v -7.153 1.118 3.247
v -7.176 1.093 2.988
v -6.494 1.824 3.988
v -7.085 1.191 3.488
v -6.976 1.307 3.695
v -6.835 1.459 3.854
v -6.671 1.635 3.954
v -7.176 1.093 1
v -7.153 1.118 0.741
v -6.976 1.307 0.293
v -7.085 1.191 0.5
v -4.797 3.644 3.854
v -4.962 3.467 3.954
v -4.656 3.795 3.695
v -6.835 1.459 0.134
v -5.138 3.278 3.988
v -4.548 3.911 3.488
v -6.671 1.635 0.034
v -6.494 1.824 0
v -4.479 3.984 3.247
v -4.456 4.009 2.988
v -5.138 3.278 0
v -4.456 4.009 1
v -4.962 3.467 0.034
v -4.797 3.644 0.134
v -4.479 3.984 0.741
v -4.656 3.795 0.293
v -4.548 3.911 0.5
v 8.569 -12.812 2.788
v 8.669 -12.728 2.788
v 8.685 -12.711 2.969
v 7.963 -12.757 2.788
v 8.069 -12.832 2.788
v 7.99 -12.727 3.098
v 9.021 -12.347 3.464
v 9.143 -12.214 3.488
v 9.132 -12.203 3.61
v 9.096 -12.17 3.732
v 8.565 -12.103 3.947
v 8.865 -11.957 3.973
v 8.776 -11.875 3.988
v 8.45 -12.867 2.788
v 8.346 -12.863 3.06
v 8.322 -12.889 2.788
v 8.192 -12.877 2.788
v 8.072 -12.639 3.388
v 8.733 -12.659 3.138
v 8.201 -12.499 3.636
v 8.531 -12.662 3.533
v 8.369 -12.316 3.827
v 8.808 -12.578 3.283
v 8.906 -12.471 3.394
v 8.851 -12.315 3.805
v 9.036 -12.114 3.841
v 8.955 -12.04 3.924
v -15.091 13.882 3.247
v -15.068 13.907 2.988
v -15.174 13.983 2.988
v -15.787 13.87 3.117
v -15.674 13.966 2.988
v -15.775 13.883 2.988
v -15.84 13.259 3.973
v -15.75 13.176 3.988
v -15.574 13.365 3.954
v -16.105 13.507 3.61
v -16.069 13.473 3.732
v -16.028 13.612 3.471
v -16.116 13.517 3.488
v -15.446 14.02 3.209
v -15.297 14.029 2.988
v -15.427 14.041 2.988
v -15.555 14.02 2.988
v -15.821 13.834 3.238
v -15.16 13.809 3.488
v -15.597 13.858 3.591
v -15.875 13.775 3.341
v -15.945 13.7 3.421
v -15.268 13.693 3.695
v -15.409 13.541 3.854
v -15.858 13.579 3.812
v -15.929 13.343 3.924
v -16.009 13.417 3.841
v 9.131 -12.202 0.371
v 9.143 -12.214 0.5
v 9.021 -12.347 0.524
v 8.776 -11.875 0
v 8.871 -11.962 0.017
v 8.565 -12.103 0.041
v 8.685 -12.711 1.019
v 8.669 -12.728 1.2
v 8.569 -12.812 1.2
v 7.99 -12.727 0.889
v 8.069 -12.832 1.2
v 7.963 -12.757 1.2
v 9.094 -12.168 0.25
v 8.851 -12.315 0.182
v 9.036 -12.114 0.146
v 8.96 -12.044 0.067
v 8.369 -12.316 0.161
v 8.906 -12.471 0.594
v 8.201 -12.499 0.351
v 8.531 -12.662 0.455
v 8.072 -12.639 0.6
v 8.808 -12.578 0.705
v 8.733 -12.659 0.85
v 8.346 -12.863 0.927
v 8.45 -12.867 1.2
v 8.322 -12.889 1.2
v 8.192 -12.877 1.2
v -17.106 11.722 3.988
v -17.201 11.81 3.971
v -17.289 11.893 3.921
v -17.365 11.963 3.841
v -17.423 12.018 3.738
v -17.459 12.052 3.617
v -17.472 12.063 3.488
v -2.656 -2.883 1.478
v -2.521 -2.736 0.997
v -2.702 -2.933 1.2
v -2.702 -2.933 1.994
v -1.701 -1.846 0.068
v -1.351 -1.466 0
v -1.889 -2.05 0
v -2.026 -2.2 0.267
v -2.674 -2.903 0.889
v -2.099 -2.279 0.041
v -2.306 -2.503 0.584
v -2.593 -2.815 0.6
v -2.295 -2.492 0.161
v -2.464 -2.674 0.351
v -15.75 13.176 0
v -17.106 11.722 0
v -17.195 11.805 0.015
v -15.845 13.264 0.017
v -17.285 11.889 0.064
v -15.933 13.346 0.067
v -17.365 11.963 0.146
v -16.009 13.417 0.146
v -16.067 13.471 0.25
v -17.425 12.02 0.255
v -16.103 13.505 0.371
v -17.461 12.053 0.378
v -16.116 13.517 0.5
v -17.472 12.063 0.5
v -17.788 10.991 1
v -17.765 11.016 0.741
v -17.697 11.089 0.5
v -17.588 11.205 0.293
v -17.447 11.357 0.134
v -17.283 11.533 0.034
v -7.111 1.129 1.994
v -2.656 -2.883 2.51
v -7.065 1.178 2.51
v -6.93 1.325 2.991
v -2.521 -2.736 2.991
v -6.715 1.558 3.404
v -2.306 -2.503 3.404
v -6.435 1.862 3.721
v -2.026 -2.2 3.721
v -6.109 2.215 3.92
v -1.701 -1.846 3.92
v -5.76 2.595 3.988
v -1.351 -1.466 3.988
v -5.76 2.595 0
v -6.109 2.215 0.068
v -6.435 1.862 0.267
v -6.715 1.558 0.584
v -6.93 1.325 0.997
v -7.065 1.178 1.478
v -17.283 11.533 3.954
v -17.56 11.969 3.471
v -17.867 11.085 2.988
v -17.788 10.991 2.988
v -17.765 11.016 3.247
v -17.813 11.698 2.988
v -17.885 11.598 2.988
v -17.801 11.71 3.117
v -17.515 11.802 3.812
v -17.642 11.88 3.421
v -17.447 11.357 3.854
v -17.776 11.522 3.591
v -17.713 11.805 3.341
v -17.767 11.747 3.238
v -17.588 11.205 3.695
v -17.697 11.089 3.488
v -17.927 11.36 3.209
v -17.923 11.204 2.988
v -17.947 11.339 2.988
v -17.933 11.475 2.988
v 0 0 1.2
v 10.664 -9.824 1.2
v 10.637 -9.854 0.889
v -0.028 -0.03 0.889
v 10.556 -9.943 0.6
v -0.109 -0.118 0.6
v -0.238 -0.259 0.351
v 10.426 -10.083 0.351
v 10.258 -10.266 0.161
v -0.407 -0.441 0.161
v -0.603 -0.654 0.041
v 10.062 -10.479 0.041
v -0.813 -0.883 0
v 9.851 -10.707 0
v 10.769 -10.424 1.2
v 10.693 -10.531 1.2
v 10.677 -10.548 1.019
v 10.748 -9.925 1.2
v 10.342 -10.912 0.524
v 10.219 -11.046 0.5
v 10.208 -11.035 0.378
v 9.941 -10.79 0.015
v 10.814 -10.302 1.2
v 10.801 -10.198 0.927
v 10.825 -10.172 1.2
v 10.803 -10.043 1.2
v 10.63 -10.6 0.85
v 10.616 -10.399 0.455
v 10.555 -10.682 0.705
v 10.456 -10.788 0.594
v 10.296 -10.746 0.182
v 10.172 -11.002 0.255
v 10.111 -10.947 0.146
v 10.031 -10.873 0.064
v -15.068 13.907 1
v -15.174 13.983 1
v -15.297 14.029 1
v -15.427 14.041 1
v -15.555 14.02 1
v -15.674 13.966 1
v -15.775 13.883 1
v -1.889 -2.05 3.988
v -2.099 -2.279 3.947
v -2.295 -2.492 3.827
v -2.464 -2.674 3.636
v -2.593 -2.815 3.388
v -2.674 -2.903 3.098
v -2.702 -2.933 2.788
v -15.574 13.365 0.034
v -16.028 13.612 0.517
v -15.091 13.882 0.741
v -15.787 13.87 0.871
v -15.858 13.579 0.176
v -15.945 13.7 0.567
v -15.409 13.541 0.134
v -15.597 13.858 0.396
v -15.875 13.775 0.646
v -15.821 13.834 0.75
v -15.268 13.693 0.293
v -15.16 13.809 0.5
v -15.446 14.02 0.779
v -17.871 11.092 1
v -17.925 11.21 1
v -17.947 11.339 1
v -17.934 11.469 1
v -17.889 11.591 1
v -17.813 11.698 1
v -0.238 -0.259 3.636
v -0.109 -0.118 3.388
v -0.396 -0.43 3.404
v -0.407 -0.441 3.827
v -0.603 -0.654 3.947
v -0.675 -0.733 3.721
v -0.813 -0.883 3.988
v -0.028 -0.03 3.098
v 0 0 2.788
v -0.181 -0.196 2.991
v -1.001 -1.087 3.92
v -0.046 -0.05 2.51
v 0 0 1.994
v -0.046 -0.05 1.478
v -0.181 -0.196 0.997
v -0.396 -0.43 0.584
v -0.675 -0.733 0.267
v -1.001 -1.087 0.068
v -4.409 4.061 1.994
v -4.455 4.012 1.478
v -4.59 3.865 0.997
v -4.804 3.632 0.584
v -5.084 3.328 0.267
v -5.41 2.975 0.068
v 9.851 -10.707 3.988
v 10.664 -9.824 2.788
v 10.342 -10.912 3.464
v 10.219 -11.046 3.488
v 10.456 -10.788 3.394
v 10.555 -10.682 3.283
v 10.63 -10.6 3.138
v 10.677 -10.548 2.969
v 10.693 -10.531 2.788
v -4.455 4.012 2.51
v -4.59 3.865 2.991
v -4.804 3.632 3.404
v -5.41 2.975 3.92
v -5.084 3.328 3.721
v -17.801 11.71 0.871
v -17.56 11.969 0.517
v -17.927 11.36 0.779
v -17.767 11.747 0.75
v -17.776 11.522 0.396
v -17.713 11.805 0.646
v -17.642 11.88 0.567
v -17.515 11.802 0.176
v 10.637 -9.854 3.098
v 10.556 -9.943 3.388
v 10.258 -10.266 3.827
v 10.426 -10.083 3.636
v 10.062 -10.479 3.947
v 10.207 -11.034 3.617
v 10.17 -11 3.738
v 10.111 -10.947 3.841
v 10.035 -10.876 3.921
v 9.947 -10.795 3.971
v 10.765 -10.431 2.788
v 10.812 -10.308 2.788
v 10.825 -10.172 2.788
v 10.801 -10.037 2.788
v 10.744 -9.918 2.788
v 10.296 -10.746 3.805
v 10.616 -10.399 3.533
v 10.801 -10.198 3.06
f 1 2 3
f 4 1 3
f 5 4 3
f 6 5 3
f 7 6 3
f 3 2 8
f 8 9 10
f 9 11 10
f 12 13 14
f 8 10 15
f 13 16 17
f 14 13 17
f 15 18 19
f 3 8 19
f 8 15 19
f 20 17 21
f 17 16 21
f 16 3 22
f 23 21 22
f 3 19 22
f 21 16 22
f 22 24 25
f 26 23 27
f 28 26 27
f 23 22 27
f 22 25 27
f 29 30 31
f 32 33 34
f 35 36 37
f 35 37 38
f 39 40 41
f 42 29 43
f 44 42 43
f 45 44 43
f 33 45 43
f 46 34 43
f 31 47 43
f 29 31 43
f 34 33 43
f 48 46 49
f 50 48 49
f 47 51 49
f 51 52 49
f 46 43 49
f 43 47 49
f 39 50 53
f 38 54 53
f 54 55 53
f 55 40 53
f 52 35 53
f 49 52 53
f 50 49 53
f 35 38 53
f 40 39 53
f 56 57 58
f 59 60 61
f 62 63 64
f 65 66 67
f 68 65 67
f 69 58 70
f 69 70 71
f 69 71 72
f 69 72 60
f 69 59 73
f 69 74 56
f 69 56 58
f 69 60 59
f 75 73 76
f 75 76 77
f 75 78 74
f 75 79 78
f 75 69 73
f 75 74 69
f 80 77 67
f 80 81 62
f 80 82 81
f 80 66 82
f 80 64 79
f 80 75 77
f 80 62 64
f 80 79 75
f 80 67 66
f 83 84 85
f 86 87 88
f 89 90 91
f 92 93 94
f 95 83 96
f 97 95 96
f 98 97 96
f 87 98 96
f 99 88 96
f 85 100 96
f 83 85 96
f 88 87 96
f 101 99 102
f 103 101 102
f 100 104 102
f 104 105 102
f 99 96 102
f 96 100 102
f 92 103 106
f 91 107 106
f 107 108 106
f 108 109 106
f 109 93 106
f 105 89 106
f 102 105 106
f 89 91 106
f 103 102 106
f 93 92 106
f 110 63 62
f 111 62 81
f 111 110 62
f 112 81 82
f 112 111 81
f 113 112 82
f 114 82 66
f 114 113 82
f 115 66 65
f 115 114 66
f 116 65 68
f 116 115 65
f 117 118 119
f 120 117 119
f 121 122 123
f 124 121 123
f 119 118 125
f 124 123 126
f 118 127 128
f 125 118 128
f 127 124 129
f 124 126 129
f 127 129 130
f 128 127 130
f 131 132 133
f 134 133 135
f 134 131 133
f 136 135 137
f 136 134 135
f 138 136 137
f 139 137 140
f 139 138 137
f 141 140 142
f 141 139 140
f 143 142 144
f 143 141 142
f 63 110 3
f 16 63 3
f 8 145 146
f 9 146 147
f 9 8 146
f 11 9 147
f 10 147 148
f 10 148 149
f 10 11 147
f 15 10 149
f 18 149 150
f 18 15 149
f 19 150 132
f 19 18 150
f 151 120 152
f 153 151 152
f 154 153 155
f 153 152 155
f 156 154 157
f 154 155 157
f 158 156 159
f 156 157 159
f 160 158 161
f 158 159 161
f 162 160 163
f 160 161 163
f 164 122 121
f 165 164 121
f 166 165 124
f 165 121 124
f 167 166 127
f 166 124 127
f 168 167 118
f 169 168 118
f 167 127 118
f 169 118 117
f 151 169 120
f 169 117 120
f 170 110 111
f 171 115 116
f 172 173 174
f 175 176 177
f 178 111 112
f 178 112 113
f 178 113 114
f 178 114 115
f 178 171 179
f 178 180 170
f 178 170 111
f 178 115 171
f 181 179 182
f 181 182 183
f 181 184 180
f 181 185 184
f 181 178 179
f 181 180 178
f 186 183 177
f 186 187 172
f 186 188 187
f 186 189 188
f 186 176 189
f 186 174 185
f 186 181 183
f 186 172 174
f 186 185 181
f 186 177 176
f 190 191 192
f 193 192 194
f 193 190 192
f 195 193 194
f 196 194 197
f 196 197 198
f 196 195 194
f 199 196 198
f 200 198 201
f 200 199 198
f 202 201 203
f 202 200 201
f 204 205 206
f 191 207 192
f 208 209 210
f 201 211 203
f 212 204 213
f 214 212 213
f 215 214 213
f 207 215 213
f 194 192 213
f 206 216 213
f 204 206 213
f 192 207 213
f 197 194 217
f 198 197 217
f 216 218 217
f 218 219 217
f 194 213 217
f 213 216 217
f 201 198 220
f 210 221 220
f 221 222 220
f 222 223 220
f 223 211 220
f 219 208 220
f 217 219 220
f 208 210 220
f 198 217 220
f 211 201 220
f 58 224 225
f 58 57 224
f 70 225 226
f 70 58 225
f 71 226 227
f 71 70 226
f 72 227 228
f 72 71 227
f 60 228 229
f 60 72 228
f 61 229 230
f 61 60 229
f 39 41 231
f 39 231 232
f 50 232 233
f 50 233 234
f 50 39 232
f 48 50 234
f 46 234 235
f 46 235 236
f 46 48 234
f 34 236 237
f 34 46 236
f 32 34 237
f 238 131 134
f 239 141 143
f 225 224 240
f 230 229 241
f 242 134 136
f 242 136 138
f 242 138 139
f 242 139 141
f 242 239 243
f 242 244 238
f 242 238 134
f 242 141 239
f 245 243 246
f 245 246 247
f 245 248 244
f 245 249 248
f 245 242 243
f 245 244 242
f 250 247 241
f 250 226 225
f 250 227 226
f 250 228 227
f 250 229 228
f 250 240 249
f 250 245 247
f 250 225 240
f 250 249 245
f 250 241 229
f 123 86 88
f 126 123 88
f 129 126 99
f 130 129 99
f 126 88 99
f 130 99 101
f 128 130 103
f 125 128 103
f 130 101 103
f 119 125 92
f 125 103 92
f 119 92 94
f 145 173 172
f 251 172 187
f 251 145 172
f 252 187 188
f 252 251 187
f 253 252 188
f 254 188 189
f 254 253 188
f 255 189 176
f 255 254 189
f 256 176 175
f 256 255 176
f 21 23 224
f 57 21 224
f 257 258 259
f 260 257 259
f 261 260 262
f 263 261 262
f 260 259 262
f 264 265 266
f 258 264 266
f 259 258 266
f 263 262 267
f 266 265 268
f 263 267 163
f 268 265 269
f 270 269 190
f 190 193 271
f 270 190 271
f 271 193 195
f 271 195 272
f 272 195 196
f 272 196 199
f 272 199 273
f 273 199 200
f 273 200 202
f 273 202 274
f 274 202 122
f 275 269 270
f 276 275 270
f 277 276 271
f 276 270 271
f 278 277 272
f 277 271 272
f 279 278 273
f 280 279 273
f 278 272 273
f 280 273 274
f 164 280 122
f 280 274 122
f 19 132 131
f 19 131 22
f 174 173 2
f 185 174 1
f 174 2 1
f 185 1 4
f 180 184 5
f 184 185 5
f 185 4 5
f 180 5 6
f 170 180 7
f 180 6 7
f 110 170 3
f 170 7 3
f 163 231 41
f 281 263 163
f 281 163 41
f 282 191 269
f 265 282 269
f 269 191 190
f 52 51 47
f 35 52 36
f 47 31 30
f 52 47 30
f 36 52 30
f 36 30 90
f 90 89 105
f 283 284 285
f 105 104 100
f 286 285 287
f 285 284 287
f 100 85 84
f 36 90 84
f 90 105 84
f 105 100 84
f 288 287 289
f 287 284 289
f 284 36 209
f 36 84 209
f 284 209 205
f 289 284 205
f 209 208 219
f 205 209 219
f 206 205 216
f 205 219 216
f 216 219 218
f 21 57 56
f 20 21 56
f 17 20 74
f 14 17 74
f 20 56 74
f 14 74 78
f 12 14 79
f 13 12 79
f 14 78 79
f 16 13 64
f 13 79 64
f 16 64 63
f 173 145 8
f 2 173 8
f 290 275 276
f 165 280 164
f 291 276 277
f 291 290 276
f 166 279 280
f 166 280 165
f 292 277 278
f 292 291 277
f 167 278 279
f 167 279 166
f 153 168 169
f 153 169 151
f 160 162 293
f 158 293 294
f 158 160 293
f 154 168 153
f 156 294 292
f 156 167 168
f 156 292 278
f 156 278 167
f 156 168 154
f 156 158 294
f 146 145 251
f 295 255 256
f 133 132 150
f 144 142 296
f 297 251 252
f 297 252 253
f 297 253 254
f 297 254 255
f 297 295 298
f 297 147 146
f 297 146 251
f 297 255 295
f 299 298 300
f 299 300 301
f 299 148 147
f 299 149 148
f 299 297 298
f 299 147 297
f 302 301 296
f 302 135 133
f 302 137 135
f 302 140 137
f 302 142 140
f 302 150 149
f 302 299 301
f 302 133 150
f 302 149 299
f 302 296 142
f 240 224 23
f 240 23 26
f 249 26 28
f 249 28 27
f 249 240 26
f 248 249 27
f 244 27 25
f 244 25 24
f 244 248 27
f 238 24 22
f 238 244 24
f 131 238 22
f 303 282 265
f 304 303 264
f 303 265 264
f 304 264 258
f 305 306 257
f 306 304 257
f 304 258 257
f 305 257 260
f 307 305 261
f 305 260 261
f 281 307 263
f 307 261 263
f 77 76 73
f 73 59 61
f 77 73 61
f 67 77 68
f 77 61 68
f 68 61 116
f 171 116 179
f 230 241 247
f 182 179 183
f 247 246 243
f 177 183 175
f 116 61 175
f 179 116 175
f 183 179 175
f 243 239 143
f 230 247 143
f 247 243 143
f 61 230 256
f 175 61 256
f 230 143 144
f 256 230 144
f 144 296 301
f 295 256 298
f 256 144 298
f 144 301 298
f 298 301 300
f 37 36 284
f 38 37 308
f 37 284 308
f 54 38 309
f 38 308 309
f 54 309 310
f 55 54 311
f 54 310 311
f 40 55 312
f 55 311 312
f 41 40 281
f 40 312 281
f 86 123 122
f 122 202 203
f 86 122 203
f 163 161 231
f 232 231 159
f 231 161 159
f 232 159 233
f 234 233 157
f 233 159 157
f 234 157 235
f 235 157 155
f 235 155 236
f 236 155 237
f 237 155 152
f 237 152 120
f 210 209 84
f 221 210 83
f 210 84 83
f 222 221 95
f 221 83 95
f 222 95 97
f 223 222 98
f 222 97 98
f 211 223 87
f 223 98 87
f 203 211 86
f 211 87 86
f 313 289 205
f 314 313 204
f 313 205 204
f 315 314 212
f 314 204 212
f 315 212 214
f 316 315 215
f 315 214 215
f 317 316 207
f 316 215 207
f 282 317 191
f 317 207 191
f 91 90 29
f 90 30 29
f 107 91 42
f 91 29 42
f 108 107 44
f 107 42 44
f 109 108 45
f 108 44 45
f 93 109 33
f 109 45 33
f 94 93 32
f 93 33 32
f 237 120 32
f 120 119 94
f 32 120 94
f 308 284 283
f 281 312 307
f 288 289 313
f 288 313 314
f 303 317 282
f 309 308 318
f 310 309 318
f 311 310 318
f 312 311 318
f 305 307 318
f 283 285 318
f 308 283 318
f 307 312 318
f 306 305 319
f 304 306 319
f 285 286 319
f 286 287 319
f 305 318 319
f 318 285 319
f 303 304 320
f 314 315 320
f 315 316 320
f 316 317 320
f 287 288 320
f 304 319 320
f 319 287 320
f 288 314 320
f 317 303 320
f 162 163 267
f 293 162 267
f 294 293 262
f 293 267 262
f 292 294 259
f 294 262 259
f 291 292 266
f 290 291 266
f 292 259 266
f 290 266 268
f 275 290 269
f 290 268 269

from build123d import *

# Parameters (mm, degrees)
F1_DEPTH = 3.9878
F3_DEPTH = 5.9944
F4_R     = 1.2
F5_R     = 1
F6_R     = 0.5
F6_2_R   = 0.5


with BuildPart() as f1:
    # F0 (on Top) → F1 (new body)
    with BuildSketch(Plane.XY):
        Polygon((11.0322314148, -10.163162402), (0, 0), (-2.7019106018, -2.9329554957), (8.330320813, -13.0961178978), align=None)
    extrude(amount=F1_DEPTH)

    # F2 (on face) → F3 (join)
    with BuildSketch(Plane(origin=(0, 0, 0), x_dir=(-0.6775441601, -0.7354820943, 0), z_dir=(-0.7354820943, 0.6775441601, 0))):
        Polygon((3.9878, 1.9939), (1.9939, 3.9878), (1.9939, 1.9939), align=None)
        with BuildLine():
            ThreePointArc((3.9878, 1.9939), (3.403800211, 3.403800211), (1.9939, 3.9878))
            Line((1.9939, 3.9878), (3.9878, 1.9939))
        make_face()
        with BuildLine():
            Line((1.9939, 1.9939), (1.9939, 3.9878))
            ThreePointArc((1.9939, 3.9878), (0.583999789, 3.403800211), (0, 1.9939))
            Line((0, 1.9939), (1.9939, 1.9939))
        make_face()
        with BuildLine():
            Line((3.9878, 1.9939), (1.9939, 1.9939))
            Line((1.9939, 1.9939), (1.9939, 0))
            ThreePointArc((1.9939, 0), (3.403800211, 0.583999789), (3.9878, 1.9939))
        make_face()
        Polygon((1.9939, 0), (1.9939, 1.9939), (0, 1.9939), align=None)
        with BuildLine():
            Line((1.9939, 0), (0, 1.9939))
            ThreePointArc((0, 1.9939), (0.583999789, 0.583999789), (1.9939, 0))
        make_face()
    extrude(amount=F3_DEPTH)

    # F4
    f4_edges = [f1.edges().sort_by_distance(p)[0] for p in [
        (5.516116, -5.081581, 3.9878),
        (5.516116, -5.081581, 0),
        (2.814205, -8.014537, 3.9878),
        (2.814205, -8.014537, 0),
    ]]
    fillet(f4_edges, radius=F4_R)

    # F6
    f6_edges = [f1.edges().sort_by_distance(p)[0] for p in [
        (8.330321, -13.096118, 1.9939),
        (8.568459, -12.837617, 0.351472),
        (8.568459, -12.837617, 3.636328),
        (9.681276, -11.62964, 0),
        (9.681276, -11.62964, 3.9878),
        (10.794094, -10.421664, 0.351472),
        (10.794094, -10.421664, 3.636328),
        (11.032231, -10.163162, 1.9939),
    ]]
    fillet(f6_edges, radius=F6_R)


with BuildPart() as f1b:
    # F0 (on Top) → F1, piece 2 (new body)
    with BuildSketch(Plane.XY):
        Polygon((-7.1761466079, 1.0931465663), (-4.4561972482, 4.0093811798), (-15.4338702201, 14.2481714444), (-18.1538195797, 11.3319368309), align=None)
    extrude(amount=F1_DEPTH)

    # F5
    f5_edges = [f1b.edges().sort_by_distance(p)[0] for p in [
        (-12.664983, 6.212542, 3.9878),
        (-12.664983, 6.212542, 0),
        (-9.945034, 9.128776, 0),
        (-9.945034, 9.128776, 3.9878),
    ]]
    fillet(f5_edges, radius=F5_R)

    # F6#2
    f6_2_edges = [f1b.edges().sort_by_distance(p)[0] for p in [
        (-15.43387, 14.248171, 1.9939),
        (-15.633643, 14.033982, 0.292893),
        (-15.633643, 14.033982, 3.694907),
        (-16.793845, 12.790054, 0),
        (-16.793845, 12.790054, 3.9878),
        (-17.954047, 11.546126, 0.292893),
        (-17.954047, 11.546126, 3.694907),
        (-18.15382, 11.331937, 1.9939),
    ]]
    fillet(f6_2_edges, radius=F6_2_R)


solid = Compound([f1.part, f1b.part])
